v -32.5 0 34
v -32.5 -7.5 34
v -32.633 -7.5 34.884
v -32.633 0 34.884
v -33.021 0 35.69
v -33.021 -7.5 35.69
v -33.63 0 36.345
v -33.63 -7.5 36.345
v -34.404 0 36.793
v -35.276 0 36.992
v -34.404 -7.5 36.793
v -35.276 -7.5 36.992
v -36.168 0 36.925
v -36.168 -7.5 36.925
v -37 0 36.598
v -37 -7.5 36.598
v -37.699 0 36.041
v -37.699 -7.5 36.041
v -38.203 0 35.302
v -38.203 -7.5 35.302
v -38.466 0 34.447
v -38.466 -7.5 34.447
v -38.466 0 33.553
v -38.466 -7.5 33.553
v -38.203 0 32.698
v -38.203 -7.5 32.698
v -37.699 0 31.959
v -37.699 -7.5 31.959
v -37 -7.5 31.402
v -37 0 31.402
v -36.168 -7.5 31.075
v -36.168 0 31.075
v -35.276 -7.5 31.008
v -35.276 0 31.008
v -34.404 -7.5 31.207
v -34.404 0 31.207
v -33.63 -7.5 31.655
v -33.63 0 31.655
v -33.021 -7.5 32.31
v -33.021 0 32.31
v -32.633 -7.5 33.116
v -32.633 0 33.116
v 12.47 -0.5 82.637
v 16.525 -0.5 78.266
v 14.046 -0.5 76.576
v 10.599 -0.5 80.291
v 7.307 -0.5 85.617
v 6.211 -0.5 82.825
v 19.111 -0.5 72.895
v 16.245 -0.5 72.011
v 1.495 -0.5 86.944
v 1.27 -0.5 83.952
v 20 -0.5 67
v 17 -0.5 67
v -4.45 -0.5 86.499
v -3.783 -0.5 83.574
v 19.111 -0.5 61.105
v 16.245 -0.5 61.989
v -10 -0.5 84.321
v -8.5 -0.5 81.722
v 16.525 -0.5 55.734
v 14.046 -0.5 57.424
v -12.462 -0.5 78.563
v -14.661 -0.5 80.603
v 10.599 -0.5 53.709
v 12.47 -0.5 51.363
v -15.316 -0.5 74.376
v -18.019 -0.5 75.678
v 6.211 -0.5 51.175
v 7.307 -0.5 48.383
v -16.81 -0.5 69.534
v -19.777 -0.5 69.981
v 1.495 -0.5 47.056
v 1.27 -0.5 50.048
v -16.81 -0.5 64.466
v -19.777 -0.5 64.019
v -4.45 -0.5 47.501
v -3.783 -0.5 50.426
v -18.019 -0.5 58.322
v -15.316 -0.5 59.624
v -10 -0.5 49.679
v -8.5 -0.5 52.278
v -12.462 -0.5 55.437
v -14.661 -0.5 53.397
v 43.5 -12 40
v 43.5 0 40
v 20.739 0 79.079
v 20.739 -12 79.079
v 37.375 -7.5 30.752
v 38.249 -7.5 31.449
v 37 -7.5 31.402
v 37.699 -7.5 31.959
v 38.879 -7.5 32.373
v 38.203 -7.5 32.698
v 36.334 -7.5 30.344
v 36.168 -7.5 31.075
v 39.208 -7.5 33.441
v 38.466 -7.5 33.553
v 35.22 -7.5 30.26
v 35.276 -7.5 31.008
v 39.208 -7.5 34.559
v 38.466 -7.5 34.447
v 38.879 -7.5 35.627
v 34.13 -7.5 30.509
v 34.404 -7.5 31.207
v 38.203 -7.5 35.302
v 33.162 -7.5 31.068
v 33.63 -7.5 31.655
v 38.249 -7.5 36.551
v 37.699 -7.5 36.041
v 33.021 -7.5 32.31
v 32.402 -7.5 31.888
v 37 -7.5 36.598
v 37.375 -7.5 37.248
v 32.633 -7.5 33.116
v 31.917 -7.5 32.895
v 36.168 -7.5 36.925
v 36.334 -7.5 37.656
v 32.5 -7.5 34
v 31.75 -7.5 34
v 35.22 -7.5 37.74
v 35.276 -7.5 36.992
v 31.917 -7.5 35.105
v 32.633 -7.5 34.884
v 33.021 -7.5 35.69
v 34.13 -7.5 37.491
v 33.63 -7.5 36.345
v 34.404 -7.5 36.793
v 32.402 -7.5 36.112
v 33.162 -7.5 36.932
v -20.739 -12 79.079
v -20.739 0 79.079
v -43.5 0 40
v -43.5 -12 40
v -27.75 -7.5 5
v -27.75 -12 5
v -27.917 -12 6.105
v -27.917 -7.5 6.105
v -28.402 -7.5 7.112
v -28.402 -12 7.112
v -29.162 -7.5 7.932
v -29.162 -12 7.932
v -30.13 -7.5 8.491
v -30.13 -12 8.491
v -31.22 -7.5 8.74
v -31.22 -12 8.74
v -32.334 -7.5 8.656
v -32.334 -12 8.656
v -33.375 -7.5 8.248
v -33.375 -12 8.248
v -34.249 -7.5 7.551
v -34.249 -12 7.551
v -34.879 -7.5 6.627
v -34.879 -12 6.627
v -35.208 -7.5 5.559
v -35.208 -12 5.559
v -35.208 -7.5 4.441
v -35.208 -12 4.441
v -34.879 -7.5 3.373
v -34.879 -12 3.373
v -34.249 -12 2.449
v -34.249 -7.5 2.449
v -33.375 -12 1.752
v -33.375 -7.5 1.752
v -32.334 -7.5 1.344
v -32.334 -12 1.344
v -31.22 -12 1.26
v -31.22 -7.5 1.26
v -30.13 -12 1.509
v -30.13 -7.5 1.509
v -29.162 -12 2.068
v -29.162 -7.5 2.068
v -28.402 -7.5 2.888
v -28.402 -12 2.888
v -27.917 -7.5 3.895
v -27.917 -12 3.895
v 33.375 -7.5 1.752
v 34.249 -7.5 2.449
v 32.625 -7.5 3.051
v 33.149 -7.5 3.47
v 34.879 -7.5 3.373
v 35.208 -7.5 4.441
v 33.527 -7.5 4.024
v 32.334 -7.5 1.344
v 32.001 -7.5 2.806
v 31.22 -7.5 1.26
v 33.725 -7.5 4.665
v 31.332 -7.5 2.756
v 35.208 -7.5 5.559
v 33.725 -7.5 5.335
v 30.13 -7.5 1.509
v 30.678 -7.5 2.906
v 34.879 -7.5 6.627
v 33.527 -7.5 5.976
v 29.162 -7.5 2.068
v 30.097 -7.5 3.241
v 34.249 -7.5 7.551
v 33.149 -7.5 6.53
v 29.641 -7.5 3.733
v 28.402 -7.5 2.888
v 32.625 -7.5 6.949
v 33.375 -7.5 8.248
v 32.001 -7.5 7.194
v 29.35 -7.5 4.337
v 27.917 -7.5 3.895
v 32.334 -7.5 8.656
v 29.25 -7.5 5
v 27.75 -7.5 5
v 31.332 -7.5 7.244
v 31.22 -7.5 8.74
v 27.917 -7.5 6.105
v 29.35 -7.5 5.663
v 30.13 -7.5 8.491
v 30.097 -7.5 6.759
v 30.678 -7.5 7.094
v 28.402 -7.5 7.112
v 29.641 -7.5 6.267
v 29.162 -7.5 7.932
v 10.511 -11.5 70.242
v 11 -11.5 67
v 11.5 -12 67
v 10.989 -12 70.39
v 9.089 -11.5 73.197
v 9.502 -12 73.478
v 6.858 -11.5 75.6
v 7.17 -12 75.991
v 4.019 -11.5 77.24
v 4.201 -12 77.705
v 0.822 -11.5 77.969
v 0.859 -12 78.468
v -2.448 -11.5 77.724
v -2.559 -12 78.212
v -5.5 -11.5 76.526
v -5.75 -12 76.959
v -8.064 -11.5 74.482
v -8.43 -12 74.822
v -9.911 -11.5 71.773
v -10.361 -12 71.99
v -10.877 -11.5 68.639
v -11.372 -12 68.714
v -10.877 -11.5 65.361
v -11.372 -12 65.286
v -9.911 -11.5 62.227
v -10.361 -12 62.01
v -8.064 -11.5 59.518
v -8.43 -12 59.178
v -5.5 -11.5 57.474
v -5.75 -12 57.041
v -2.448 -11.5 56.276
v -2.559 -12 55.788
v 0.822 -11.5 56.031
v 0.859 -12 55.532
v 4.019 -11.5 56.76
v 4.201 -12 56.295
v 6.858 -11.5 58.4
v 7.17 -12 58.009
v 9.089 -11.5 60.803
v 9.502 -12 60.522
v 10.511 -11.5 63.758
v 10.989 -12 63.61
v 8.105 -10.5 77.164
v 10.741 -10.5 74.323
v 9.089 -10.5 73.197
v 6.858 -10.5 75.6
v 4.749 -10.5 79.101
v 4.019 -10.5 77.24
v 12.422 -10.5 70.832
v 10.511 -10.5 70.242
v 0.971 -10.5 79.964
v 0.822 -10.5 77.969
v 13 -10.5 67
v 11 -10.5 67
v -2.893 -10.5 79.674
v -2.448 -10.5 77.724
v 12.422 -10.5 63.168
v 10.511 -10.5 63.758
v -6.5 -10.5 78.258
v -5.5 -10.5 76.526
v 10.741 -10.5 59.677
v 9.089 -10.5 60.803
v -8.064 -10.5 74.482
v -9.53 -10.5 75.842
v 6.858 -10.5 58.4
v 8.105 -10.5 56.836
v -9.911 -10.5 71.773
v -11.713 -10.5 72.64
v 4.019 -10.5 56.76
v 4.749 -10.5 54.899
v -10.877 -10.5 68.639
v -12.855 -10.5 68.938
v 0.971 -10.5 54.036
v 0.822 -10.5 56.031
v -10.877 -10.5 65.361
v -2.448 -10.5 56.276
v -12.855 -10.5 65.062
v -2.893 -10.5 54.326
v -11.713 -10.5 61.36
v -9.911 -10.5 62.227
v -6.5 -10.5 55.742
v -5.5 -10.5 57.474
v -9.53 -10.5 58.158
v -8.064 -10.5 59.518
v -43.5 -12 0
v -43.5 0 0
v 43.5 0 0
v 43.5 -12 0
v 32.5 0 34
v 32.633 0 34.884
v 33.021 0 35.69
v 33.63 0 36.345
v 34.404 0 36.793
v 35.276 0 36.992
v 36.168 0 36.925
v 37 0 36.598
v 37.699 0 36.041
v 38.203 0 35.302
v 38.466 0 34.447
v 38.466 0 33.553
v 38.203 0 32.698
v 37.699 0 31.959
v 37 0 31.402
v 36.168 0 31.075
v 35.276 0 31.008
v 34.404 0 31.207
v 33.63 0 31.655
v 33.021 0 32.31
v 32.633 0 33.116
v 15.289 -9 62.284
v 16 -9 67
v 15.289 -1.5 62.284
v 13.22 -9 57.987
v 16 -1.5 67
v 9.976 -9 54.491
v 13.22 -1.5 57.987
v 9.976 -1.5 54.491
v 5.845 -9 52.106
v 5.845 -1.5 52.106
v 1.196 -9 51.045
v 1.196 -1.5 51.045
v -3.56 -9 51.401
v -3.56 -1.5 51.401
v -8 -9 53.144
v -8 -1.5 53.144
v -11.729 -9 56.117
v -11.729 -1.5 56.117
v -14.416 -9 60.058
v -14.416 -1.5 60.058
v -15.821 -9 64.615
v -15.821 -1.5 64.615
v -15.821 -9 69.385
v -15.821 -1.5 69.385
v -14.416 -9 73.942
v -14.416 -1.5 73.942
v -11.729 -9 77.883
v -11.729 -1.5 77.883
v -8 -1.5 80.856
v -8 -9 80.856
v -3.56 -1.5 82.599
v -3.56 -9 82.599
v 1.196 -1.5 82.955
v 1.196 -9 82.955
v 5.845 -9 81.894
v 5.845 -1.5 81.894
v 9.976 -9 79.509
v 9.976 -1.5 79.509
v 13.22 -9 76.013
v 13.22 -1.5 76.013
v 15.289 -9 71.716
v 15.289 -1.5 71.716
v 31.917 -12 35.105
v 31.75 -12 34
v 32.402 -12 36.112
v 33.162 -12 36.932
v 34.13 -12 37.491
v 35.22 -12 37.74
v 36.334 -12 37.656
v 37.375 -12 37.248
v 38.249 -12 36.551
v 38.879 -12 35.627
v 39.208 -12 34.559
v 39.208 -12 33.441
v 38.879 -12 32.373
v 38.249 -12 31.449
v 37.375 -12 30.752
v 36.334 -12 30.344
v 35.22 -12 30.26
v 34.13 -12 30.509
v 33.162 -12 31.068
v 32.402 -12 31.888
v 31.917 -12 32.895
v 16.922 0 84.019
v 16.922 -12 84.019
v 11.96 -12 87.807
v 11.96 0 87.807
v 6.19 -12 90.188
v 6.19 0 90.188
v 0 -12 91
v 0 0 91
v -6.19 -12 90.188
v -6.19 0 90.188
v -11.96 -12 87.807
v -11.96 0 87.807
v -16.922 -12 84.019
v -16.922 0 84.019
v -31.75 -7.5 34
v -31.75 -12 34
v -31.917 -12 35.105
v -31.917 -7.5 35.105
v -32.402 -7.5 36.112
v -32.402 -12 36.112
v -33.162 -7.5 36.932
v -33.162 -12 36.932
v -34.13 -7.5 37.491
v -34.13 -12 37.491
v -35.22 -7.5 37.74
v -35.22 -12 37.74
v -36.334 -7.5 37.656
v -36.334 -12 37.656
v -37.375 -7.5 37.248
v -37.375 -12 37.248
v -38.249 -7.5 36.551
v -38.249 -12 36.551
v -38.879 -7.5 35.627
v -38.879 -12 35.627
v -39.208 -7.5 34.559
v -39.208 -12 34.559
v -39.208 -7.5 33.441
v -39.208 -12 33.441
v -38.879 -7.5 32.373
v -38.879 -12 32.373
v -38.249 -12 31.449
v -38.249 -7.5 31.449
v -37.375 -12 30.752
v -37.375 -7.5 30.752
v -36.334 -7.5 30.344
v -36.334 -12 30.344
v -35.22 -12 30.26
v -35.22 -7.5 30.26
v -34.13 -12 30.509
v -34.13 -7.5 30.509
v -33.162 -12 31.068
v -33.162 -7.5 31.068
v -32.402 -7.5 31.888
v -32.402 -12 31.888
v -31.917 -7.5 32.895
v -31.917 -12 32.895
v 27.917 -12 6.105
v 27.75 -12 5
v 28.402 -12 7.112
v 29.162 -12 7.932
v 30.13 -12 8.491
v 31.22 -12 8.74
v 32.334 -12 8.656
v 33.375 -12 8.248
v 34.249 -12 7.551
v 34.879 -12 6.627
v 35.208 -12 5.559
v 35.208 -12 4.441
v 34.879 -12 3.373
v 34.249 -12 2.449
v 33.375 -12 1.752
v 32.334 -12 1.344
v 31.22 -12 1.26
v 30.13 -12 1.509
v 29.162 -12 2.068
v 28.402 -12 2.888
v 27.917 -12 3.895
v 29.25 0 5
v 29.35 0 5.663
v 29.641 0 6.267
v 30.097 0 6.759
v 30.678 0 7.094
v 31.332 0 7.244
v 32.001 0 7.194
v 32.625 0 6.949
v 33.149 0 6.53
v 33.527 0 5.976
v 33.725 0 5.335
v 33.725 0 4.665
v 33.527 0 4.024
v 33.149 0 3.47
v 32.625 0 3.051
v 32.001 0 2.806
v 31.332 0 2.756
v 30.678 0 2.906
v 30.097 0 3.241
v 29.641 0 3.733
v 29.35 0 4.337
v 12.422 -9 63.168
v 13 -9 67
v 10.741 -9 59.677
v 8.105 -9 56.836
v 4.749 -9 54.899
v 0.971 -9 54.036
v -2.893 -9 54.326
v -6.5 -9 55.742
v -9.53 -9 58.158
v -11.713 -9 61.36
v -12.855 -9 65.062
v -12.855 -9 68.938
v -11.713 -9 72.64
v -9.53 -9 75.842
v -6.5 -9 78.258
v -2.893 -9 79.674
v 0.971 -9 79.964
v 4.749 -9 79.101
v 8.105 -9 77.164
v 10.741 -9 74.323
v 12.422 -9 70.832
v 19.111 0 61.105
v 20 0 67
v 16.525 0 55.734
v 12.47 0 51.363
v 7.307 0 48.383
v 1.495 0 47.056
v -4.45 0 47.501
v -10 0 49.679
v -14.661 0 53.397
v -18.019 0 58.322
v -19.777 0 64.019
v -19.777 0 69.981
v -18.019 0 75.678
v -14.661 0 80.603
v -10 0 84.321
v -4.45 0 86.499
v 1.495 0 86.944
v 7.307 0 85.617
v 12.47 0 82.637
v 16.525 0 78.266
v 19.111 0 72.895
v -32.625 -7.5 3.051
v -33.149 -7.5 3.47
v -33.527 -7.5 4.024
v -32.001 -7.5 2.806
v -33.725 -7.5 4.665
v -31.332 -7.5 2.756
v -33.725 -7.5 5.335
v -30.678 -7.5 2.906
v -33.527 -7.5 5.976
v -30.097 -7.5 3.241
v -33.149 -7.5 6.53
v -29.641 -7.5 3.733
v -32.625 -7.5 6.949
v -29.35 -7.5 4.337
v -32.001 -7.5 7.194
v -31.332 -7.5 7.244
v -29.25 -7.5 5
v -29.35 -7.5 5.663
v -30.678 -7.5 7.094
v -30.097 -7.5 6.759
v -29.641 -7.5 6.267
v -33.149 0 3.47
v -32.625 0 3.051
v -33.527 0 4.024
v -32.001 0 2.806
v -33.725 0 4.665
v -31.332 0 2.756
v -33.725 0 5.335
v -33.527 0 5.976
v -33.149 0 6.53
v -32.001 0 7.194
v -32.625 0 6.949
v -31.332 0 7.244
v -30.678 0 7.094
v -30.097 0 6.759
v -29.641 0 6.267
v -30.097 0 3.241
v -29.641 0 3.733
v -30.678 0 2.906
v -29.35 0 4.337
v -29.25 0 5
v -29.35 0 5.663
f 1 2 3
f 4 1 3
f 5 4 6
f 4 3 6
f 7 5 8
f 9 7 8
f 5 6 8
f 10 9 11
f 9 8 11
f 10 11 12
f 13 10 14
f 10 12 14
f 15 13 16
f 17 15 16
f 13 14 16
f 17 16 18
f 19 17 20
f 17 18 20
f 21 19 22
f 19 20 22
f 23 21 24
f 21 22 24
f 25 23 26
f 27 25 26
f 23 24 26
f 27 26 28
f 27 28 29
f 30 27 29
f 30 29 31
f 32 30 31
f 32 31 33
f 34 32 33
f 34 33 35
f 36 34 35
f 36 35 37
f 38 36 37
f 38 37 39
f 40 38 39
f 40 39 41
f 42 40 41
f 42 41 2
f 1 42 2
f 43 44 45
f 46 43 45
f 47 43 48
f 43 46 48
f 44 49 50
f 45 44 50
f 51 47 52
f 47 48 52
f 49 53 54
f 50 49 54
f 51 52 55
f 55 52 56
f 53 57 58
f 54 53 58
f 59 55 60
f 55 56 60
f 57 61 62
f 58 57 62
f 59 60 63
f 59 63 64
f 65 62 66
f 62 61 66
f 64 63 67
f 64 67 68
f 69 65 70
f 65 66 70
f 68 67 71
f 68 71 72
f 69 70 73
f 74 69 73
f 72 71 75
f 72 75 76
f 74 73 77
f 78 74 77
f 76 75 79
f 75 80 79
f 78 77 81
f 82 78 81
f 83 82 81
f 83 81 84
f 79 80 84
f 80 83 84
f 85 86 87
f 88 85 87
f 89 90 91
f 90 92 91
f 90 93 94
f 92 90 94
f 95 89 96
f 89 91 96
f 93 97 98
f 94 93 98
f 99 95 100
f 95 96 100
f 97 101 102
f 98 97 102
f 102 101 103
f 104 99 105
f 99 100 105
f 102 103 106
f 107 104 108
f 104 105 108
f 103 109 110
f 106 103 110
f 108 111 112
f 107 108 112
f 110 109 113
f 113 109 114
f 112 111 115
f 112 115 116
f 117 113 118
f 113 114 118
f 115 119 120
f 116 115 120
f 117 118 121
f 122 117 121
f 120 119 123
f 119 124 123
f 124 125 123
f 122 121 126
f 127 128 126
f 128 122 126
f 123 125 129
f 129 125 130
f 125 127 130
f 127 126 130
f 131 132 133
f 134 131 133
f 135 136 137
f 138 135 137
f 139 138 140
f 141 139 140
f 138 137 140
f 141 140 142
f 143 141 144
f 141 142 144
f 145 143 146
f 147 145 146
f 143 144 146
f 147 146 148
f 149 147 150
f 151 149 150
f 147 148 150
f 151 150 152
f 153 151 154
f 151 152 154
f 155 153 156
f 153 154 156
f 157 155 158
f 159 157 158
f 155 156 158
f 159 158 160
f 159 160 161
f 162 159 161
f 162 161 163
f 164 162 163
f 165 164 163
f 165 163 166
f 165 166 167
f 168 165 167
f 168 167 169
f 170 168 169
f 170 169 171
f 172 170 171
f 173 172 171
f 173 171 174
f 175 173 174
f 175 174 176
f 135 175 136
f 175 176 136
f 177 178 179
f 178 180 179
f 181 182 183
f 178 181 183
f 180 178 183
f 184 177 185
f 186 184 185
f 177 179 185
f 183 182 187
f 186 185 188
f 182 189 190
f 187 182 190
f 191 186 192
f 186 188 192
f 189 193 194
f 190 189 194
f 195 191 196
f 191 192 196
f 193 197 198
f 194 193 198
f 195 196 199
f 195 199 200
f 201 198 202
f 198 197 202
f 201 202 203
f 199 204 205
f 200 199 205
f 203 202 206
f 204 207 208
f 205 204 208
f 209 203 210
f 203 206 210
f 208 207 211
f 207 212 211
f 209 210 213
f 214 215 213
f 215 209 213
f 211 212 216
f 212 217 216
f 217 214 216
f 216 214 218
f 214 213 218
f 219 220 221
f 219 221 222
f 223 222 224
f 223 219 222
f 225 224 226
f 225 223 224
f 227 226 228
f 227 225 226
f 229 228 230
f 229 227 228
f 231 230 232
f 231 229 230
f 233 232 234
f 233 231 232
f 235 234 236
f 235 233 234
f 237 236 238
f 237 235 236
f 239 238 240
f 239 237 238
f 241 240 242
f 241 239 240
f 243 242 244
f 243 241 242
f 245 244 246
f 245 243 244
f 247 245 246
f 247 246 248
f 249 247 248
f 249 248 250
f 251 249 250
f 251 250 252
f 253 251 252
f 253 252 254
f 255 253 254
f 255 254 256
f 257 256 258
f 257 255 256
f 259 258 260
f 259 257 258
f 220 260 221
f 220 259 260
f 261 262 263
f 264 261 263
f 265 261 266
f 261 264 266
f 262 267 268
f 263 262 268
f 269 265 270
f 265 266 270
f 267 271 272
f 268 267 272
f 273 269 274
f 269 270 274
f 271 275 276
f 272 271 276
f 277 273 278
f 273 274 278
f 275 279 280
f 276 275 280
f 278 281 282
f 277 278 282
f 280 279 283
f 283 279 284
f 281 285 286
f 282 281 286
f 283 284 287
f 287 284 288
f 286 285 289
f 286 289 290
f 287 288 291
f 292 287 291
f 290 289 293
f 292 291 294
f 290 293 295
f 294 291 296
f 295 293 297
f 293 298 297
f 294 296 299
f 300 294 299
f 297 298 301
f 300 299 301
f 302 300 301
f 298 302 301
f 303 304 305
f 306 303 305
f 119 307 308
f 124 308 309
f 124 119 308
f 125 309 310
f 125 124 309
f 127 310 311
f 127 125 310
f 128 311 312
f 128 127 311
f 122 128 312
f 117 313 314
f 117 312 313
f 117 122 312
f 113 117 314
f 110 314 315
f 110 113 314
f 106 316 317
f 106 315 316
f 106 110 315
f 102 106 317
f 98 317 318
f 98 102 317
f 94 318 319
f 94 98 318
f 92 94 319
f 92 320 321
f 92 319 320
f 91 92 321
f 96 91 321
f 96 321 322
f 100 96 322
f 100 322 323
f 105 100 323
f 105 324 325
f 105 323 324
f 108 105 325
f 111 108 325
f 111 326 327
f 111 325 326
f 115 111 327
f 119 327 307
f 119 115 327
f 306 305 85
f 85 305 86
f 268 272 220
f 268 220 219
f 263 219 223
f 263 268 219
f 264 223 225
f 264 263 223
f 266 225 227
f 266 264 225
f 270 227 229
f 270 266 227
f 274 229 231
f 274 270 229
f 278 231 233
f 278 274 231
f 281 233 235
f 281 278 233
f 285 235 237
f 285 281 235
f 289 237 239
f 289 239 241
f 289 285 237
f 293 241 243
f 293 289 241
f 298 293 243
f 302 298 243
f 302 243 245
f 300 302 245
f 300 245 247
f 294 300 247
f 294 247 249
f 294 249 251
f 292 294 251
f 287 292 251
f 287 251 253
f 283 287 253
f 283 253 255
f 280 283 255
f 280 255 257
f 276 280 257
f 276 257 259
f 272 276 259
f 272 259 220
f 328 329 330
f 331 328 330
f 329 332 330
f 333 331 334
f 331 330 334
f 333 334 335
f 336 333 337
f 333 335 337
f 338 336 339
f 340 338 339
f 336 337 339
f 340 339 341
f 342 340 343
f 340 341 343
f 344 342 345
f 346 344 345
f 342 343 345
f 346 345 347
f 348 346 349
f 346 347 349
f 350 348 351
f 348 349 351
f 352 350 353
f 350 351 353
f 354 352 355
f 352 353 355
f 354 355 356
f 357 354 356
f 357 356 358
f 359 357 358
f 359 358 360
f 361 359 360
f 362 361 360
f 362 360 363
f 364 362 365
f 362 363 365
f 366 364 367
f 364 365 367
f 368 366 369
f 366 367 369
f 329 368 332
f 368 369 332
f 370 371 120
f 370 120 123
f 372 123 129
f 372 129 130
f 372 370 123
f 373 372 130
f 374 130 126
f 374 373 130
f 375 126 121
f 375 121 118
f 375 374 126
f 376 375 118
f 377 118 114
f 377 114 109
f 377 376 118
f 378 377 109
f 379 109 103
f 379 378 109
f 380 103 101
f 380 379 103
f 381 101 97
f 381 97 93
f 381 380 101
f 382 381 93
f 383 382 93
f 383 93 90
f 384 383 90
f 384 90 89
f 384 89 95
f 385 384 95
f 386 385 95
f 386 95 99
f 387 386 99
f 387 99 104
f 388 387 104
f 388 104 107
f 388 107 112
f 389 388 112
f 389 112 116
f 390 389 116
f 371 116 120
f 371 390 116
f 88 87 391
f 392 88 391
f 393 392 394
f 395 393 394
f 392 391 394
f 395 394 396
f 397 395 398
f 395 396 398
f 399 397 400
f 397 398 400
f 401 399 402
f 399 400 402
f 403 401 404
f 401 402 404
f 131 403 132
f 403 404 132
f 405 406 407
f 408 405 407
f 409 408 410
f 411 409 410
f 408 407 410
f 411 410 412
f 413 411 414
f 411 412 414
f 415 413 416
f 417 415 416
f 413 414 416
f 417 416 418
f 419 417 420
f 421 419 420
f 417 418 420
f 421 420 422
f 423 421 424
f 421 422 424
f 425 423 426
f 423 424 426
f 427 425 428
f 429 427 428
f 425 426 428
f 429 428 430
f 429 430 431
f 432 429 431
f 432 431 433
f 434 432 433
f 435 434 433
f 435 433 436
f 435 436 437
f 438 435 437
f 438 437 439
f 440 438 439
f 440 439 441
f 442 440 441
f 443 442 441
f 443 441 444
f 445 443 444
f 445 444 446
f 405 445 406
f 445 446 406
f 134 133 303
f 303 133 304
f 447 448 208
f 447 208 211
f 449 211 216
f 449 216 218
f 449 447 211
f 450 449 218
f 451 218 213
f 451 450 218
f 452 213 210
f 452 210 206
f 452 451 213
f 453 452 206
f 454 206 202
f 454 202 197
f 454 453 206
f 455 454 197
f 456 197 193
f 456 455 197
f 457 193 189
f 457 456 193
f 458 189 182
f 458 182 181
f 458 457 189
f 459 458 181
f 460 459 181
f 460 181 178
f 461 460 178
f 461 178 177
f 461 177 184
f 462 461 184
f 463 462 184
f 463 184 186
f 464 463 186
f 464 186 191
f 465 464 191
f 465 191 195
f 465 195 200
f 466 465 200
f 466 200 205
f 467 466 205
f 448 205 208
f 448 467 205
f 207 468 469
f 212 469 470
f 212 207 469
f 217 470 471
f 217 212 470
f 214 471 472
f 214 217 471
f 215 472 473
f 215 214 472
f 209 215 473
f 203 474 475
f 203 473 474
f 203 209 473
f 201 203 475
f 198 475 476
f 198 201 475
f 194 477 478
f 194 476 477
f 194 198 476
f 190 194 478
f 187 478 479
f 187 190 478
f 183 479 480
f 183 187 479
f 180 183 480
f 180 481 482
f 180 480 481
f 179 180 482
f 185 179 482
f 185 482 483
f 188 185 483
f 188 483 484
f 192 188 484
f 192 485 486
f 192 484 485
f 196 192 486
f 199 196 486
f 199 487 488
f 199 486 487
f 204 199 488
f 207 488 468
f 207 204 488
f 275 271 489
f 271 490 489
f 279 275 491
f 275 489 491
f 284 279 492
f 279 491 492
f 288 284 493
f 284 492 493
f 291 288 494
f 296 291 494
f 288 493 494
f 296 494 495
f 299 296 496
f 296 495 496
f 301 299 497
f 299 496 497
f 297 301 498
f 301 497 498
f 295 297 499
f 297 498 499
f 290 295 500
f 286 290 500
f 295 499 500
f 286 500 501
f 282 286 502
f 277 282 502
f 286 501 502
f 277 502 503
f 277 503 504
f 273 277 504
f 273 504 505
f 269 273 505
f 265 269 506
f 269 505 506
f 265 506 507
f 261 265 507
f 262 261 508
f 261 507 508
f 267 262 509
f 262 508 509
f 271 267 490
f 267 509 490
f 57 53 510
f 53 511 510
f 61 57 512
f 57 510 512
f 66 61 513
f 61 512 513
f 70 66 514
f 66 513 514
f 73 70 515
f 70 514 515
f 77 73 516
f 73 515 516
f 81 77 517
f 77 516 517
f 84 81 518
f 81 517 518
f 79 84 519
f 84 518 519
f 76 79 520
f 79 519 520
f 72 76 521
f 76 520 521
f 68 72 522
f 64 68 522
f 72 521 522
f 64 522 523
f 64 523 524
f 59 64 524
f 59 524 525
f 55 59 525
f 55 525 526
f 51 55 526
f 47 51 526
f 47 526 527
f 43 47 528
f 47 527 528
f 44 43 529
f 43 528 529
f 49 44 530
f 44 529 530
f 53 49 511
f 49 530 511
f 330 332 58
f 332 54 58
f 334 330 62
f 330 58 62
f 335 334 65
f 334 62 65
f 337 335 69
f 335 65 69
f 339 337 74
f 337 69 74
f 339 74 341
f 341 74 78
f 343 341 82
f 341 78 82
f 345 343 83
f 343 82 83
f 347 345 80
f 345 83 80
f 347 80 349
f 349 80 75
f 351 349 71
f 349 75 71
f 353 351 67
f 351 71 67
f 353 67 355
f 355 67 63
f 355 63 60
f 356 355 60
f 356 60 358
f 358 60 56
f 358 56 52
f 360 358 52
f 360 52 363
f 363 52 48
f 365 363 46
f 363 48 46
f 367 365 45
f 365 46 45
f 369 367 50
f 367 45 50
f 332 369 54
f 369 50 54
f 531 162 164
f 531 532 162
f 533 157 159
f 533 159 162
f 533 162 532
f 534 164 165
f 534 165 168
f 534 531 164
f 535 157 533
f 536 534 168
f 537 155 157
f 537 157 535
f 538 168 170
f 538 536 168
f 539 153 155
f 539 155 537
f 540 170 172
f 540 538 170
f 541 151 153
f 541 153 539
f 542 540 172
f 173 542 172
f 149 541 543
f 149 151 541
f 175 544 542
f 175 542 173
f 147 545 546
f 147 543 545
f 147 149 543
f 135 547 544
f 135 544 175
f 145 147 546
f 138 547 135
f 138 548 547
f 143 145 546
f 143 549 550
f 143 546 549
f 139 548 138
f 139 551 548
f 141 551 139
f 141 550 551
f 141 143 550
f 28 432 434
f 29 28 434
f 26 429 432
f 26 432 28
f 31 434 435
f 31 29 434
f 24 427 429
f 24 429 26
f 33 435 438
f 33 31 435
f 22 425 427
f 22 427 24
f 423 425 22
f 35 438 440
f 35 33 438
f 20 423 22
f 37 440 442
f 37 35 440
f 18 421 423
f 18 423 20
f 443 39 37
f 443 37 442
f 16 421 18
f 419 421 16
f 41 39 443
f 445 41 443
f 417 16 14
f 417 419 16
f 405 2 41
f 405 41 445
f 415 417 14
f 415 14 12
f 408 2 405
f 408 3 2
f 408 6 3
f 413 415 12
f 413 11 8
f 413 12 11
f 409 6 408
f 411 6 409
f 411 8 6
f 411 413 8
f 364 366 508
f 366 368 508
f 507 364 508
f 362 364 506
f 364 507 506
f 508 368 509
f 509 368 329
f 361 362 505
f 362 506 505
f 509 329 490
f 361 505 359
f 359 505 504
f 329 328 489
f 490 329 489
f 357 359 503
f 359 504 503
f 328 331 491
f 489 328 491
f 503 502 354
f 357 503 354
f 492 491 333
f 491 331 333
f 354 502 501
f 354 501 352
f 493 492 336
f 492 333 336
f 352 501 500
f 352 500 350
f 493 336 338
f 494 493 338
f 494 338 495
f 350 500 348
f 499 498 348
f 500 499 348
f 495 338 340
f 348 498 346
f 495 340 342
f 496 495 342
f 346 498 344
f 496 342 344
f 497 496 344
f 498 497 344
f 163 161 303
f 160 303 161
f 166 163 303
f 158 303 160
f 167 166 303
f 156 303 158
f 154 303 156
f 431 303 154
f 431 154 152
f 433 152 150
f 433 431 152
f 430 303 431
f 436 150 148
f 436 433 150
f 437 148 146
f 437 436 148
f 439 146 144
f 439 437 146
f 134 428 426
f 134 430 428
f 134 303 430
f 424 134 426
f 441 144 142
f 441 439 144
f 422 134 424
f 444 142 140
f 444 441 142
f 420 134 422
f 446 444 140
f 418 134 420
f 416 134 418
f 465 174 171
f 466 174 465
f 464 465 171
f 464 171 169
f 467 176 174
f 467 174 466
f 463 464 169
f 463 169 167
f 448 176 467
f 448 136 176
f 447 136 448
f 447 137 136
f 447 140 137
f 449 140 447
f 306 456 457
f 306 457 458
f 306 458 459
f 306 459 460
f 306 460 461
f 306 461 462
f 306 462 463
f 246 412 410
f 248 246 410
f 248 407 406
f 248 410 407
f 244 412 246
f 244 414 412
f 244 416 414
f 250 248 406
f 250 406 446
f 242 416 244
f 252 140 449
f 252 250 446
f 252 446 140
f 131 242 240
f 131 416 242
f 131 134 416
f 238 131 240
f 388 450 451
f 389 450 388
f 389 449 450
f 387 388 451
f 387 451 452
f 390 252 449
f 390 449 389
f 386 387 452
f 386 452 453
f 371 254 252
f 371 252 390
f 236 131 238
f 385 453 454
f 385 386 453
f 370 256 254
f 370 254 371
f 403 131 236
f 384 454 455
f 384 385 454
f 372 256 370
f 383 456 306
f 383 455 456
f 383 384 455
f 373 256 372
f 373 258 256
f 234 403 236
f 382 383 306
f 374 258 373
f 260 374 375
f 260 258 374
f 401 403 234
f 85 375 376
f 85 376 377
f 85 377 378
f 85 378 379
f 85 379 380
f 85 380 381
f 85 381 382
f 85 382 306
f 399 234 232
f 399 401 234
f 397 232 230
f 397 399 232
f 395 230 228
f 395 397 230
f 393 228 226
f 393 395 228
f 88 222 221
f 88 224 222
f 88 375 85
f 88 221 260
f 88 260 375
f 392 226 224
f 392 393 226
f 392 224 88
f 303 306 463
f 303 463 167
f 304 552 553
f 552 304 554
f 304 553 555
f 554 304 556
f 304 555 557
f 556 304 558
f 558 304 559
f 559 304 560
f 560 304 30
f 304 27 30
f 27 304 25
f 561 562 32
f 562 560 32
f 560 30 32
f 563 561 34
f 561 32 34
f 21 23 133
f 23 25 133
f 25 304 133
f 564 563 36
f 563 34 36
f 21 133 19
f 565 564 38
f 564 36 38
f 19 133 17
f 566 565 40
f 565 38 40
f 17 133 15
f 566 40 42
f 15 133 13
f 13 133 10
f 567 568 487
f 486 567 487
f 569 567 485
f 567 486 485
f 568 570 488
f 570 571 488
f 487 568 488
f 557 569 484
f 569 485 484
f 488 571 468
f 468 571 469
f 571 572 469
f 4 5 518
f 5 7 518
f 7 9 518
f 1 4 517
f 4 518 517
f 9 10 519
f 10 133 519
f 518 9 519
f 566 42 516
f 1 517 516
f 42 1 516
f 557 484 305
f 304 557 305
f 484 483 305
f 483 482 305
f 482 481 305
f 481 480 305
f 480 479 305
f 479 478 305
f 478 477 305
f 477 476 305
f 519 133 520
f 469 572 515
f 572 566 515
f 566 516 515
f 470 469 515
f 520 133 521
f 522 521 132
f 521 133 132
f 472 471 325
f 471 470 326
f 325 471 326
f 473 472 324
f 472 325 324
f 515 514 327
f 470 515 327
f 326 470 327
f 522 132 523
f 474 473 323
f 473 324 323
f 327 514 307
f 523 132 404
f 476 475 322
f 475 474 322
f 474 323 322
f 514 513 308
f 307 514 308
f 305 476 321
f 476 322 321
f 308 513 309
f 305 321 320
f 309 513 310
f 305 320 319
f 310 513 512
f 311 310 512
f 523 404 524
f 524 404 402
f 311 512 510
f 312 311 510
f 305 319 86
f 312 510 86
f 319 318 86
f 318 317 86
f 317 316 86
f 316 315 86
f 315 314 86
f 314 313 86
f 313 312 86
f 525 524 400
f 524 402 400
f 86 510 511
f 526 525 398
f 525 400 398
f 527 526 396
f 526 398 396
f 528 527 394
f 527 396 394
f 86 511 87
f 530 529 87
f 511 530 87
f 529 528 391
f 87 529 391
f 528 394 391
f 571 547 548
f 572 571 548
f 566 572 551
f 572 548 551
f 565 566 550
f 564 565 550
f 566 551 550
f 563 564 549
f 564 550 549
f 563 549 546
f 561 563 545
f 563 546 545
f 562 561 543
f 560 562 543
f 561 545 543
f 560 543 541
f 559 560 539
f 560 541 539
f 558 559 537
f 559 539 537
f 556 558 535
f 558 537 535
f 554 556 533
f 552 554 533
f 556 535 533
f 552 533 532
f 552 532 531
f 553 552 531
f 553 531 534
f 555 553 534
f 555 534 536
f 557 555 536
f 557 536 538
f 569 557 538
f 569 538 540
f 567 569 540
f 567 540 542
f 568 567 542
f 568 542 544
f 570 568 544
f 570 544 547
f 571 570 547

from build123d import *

# Parameters (mm, degrees)
F0_R     = 11
F1_DEPTH = 12
F2_R     = 3
F3_DEPTH = 18
F2_R_2   = 3.75
F4_DEPTH = 4.5
F2_R_3   = 2.25
F5_DEPTH = 12.001
F6_DEPTH = 4.5
F10_SIZE = 0.5


# Not quite as in the source:
# - a pattern or mirror of a feature is missing from the dataset's text; its kind, count and spacing are read off the source's solid


with BuildPart() as f1:
    # F0 (on Front) → F1 (new body)
    with BuildSketch(Plane.XZ):
        with BuildLine():
            Line((-43.5, 40), (-43.5, 0))
            Line((-43.5, 0), (43.5, 0))
            Line((43.5, 0), (43.5, 40))
            Line((43.5, 40), (20.7387457553, 79.0790903836))
            ThreePointArc((20.7387457553, 79.0790903836), (0, 91), (-20.7387457553, 79.0790903836))
            Line((-20.7387457553, 79.0790903836), (-43.5, 40))
        make_face()
        with Locations((0, 67)):
            Circle(F0_R, mode=Mode.SUBTRACT)
    extrude(amount=F1_DEPTH)

    # F2 (on face) → F3 (cut)
    with BuildSketch(Plane.XZ.offset(12)):
        with Locations((-35.5, 34)):
            Circle(F2_R)
    f3 = extrude(amount=-F3_DEPTH, mode=Mode.SUBTRACT)

    # F3_copies: F3 across plane
    add(f3.mirror(Plane(origin=(0, 0, 0), x_dir=(0, 0, 1), z_dir=(1, 0, 0))), mode=Mode.SUBTRACT)

    # F2 (on face) → F4 (cut)
    with BuildSketch(Plane.XZ.offset(12)):
        with Locations((-35.5, 34)):
            Circle(F2_R_2)
        with Locations((-35.5, 34)):
            Circle(F2_R, mode=Mode.SUBTRACT)
    f4 = extrude(amount=-F4_DEPTH, mode=Mode.SUBTRACT)

    # F4_copies: F4 across plane
    add(f4.mirror(Plane(origin=(0, 0, 0), x_dir=(0, 0, 1), z_dir=(1, 0, 0))), mode=Mode.SUBTRACT)

    # F2 (on face) → F5 (cut, through all)
    with BuildSketch(Plane.XZ.offset(12)):
        with Locations((-31.5, 5)):
            Circle(F2_R_3)
    f5 = extrude(amount=-F5_DEPTH, mode=Mode.SUBTRACT)

    # F5_copies: F5 across plane
    add(f5.mirror(Plane(origin=(0, 0, 0), x_dir=(0, 0, 1), z_dir=(1, 0, 0))), mode=Mode.SUBTRACT)

    # F2 (on face) → F6 (cut)
    with BuildSketch(Plane.XZ.offset(12)):
        with Locations((-31.5, 5)):
            Circle(F2_R_2)
        with Locations((-31.5, 5)):
            Circle(F2_R_3, mode=Mode.SUBTRACT)
    f6 = extrude(amount=-F6_DEPTH, mode=Mode.SUBTRACT)

    # F6_copies: F6 across plane
    add(f6.mirror(Plane(origin=(0, 0, 0), x_dir=(0, 0, 1), z_dir=(1, 0, 0))), mode=Mode.SUBTRACT)

    # F8 (on offset) → F9 (revolve, cut)
    with BuildSketch(Plane.XY.offset(67)):
        Polygon((0, 0), (0, -12), (11, -12), (11, -10.5), (13, -10.5), (13, -9), (16, -9), (16, -1.5), (17, -0.5), (20, -0.5), (20, 0), align=None)
    revolve(axis=Axis((0, -9.5826864708, 67), (0, 1, 0)), mode=Mode.SUBTRACT)

    # F10
    f10_edges = [f1.edges().sort_by_distance(p)[0] for p in [
        (-11, -12, 67),
    ]]
    chamfer(f10_edges, length=F10_SIZE)


solid = f1.part
